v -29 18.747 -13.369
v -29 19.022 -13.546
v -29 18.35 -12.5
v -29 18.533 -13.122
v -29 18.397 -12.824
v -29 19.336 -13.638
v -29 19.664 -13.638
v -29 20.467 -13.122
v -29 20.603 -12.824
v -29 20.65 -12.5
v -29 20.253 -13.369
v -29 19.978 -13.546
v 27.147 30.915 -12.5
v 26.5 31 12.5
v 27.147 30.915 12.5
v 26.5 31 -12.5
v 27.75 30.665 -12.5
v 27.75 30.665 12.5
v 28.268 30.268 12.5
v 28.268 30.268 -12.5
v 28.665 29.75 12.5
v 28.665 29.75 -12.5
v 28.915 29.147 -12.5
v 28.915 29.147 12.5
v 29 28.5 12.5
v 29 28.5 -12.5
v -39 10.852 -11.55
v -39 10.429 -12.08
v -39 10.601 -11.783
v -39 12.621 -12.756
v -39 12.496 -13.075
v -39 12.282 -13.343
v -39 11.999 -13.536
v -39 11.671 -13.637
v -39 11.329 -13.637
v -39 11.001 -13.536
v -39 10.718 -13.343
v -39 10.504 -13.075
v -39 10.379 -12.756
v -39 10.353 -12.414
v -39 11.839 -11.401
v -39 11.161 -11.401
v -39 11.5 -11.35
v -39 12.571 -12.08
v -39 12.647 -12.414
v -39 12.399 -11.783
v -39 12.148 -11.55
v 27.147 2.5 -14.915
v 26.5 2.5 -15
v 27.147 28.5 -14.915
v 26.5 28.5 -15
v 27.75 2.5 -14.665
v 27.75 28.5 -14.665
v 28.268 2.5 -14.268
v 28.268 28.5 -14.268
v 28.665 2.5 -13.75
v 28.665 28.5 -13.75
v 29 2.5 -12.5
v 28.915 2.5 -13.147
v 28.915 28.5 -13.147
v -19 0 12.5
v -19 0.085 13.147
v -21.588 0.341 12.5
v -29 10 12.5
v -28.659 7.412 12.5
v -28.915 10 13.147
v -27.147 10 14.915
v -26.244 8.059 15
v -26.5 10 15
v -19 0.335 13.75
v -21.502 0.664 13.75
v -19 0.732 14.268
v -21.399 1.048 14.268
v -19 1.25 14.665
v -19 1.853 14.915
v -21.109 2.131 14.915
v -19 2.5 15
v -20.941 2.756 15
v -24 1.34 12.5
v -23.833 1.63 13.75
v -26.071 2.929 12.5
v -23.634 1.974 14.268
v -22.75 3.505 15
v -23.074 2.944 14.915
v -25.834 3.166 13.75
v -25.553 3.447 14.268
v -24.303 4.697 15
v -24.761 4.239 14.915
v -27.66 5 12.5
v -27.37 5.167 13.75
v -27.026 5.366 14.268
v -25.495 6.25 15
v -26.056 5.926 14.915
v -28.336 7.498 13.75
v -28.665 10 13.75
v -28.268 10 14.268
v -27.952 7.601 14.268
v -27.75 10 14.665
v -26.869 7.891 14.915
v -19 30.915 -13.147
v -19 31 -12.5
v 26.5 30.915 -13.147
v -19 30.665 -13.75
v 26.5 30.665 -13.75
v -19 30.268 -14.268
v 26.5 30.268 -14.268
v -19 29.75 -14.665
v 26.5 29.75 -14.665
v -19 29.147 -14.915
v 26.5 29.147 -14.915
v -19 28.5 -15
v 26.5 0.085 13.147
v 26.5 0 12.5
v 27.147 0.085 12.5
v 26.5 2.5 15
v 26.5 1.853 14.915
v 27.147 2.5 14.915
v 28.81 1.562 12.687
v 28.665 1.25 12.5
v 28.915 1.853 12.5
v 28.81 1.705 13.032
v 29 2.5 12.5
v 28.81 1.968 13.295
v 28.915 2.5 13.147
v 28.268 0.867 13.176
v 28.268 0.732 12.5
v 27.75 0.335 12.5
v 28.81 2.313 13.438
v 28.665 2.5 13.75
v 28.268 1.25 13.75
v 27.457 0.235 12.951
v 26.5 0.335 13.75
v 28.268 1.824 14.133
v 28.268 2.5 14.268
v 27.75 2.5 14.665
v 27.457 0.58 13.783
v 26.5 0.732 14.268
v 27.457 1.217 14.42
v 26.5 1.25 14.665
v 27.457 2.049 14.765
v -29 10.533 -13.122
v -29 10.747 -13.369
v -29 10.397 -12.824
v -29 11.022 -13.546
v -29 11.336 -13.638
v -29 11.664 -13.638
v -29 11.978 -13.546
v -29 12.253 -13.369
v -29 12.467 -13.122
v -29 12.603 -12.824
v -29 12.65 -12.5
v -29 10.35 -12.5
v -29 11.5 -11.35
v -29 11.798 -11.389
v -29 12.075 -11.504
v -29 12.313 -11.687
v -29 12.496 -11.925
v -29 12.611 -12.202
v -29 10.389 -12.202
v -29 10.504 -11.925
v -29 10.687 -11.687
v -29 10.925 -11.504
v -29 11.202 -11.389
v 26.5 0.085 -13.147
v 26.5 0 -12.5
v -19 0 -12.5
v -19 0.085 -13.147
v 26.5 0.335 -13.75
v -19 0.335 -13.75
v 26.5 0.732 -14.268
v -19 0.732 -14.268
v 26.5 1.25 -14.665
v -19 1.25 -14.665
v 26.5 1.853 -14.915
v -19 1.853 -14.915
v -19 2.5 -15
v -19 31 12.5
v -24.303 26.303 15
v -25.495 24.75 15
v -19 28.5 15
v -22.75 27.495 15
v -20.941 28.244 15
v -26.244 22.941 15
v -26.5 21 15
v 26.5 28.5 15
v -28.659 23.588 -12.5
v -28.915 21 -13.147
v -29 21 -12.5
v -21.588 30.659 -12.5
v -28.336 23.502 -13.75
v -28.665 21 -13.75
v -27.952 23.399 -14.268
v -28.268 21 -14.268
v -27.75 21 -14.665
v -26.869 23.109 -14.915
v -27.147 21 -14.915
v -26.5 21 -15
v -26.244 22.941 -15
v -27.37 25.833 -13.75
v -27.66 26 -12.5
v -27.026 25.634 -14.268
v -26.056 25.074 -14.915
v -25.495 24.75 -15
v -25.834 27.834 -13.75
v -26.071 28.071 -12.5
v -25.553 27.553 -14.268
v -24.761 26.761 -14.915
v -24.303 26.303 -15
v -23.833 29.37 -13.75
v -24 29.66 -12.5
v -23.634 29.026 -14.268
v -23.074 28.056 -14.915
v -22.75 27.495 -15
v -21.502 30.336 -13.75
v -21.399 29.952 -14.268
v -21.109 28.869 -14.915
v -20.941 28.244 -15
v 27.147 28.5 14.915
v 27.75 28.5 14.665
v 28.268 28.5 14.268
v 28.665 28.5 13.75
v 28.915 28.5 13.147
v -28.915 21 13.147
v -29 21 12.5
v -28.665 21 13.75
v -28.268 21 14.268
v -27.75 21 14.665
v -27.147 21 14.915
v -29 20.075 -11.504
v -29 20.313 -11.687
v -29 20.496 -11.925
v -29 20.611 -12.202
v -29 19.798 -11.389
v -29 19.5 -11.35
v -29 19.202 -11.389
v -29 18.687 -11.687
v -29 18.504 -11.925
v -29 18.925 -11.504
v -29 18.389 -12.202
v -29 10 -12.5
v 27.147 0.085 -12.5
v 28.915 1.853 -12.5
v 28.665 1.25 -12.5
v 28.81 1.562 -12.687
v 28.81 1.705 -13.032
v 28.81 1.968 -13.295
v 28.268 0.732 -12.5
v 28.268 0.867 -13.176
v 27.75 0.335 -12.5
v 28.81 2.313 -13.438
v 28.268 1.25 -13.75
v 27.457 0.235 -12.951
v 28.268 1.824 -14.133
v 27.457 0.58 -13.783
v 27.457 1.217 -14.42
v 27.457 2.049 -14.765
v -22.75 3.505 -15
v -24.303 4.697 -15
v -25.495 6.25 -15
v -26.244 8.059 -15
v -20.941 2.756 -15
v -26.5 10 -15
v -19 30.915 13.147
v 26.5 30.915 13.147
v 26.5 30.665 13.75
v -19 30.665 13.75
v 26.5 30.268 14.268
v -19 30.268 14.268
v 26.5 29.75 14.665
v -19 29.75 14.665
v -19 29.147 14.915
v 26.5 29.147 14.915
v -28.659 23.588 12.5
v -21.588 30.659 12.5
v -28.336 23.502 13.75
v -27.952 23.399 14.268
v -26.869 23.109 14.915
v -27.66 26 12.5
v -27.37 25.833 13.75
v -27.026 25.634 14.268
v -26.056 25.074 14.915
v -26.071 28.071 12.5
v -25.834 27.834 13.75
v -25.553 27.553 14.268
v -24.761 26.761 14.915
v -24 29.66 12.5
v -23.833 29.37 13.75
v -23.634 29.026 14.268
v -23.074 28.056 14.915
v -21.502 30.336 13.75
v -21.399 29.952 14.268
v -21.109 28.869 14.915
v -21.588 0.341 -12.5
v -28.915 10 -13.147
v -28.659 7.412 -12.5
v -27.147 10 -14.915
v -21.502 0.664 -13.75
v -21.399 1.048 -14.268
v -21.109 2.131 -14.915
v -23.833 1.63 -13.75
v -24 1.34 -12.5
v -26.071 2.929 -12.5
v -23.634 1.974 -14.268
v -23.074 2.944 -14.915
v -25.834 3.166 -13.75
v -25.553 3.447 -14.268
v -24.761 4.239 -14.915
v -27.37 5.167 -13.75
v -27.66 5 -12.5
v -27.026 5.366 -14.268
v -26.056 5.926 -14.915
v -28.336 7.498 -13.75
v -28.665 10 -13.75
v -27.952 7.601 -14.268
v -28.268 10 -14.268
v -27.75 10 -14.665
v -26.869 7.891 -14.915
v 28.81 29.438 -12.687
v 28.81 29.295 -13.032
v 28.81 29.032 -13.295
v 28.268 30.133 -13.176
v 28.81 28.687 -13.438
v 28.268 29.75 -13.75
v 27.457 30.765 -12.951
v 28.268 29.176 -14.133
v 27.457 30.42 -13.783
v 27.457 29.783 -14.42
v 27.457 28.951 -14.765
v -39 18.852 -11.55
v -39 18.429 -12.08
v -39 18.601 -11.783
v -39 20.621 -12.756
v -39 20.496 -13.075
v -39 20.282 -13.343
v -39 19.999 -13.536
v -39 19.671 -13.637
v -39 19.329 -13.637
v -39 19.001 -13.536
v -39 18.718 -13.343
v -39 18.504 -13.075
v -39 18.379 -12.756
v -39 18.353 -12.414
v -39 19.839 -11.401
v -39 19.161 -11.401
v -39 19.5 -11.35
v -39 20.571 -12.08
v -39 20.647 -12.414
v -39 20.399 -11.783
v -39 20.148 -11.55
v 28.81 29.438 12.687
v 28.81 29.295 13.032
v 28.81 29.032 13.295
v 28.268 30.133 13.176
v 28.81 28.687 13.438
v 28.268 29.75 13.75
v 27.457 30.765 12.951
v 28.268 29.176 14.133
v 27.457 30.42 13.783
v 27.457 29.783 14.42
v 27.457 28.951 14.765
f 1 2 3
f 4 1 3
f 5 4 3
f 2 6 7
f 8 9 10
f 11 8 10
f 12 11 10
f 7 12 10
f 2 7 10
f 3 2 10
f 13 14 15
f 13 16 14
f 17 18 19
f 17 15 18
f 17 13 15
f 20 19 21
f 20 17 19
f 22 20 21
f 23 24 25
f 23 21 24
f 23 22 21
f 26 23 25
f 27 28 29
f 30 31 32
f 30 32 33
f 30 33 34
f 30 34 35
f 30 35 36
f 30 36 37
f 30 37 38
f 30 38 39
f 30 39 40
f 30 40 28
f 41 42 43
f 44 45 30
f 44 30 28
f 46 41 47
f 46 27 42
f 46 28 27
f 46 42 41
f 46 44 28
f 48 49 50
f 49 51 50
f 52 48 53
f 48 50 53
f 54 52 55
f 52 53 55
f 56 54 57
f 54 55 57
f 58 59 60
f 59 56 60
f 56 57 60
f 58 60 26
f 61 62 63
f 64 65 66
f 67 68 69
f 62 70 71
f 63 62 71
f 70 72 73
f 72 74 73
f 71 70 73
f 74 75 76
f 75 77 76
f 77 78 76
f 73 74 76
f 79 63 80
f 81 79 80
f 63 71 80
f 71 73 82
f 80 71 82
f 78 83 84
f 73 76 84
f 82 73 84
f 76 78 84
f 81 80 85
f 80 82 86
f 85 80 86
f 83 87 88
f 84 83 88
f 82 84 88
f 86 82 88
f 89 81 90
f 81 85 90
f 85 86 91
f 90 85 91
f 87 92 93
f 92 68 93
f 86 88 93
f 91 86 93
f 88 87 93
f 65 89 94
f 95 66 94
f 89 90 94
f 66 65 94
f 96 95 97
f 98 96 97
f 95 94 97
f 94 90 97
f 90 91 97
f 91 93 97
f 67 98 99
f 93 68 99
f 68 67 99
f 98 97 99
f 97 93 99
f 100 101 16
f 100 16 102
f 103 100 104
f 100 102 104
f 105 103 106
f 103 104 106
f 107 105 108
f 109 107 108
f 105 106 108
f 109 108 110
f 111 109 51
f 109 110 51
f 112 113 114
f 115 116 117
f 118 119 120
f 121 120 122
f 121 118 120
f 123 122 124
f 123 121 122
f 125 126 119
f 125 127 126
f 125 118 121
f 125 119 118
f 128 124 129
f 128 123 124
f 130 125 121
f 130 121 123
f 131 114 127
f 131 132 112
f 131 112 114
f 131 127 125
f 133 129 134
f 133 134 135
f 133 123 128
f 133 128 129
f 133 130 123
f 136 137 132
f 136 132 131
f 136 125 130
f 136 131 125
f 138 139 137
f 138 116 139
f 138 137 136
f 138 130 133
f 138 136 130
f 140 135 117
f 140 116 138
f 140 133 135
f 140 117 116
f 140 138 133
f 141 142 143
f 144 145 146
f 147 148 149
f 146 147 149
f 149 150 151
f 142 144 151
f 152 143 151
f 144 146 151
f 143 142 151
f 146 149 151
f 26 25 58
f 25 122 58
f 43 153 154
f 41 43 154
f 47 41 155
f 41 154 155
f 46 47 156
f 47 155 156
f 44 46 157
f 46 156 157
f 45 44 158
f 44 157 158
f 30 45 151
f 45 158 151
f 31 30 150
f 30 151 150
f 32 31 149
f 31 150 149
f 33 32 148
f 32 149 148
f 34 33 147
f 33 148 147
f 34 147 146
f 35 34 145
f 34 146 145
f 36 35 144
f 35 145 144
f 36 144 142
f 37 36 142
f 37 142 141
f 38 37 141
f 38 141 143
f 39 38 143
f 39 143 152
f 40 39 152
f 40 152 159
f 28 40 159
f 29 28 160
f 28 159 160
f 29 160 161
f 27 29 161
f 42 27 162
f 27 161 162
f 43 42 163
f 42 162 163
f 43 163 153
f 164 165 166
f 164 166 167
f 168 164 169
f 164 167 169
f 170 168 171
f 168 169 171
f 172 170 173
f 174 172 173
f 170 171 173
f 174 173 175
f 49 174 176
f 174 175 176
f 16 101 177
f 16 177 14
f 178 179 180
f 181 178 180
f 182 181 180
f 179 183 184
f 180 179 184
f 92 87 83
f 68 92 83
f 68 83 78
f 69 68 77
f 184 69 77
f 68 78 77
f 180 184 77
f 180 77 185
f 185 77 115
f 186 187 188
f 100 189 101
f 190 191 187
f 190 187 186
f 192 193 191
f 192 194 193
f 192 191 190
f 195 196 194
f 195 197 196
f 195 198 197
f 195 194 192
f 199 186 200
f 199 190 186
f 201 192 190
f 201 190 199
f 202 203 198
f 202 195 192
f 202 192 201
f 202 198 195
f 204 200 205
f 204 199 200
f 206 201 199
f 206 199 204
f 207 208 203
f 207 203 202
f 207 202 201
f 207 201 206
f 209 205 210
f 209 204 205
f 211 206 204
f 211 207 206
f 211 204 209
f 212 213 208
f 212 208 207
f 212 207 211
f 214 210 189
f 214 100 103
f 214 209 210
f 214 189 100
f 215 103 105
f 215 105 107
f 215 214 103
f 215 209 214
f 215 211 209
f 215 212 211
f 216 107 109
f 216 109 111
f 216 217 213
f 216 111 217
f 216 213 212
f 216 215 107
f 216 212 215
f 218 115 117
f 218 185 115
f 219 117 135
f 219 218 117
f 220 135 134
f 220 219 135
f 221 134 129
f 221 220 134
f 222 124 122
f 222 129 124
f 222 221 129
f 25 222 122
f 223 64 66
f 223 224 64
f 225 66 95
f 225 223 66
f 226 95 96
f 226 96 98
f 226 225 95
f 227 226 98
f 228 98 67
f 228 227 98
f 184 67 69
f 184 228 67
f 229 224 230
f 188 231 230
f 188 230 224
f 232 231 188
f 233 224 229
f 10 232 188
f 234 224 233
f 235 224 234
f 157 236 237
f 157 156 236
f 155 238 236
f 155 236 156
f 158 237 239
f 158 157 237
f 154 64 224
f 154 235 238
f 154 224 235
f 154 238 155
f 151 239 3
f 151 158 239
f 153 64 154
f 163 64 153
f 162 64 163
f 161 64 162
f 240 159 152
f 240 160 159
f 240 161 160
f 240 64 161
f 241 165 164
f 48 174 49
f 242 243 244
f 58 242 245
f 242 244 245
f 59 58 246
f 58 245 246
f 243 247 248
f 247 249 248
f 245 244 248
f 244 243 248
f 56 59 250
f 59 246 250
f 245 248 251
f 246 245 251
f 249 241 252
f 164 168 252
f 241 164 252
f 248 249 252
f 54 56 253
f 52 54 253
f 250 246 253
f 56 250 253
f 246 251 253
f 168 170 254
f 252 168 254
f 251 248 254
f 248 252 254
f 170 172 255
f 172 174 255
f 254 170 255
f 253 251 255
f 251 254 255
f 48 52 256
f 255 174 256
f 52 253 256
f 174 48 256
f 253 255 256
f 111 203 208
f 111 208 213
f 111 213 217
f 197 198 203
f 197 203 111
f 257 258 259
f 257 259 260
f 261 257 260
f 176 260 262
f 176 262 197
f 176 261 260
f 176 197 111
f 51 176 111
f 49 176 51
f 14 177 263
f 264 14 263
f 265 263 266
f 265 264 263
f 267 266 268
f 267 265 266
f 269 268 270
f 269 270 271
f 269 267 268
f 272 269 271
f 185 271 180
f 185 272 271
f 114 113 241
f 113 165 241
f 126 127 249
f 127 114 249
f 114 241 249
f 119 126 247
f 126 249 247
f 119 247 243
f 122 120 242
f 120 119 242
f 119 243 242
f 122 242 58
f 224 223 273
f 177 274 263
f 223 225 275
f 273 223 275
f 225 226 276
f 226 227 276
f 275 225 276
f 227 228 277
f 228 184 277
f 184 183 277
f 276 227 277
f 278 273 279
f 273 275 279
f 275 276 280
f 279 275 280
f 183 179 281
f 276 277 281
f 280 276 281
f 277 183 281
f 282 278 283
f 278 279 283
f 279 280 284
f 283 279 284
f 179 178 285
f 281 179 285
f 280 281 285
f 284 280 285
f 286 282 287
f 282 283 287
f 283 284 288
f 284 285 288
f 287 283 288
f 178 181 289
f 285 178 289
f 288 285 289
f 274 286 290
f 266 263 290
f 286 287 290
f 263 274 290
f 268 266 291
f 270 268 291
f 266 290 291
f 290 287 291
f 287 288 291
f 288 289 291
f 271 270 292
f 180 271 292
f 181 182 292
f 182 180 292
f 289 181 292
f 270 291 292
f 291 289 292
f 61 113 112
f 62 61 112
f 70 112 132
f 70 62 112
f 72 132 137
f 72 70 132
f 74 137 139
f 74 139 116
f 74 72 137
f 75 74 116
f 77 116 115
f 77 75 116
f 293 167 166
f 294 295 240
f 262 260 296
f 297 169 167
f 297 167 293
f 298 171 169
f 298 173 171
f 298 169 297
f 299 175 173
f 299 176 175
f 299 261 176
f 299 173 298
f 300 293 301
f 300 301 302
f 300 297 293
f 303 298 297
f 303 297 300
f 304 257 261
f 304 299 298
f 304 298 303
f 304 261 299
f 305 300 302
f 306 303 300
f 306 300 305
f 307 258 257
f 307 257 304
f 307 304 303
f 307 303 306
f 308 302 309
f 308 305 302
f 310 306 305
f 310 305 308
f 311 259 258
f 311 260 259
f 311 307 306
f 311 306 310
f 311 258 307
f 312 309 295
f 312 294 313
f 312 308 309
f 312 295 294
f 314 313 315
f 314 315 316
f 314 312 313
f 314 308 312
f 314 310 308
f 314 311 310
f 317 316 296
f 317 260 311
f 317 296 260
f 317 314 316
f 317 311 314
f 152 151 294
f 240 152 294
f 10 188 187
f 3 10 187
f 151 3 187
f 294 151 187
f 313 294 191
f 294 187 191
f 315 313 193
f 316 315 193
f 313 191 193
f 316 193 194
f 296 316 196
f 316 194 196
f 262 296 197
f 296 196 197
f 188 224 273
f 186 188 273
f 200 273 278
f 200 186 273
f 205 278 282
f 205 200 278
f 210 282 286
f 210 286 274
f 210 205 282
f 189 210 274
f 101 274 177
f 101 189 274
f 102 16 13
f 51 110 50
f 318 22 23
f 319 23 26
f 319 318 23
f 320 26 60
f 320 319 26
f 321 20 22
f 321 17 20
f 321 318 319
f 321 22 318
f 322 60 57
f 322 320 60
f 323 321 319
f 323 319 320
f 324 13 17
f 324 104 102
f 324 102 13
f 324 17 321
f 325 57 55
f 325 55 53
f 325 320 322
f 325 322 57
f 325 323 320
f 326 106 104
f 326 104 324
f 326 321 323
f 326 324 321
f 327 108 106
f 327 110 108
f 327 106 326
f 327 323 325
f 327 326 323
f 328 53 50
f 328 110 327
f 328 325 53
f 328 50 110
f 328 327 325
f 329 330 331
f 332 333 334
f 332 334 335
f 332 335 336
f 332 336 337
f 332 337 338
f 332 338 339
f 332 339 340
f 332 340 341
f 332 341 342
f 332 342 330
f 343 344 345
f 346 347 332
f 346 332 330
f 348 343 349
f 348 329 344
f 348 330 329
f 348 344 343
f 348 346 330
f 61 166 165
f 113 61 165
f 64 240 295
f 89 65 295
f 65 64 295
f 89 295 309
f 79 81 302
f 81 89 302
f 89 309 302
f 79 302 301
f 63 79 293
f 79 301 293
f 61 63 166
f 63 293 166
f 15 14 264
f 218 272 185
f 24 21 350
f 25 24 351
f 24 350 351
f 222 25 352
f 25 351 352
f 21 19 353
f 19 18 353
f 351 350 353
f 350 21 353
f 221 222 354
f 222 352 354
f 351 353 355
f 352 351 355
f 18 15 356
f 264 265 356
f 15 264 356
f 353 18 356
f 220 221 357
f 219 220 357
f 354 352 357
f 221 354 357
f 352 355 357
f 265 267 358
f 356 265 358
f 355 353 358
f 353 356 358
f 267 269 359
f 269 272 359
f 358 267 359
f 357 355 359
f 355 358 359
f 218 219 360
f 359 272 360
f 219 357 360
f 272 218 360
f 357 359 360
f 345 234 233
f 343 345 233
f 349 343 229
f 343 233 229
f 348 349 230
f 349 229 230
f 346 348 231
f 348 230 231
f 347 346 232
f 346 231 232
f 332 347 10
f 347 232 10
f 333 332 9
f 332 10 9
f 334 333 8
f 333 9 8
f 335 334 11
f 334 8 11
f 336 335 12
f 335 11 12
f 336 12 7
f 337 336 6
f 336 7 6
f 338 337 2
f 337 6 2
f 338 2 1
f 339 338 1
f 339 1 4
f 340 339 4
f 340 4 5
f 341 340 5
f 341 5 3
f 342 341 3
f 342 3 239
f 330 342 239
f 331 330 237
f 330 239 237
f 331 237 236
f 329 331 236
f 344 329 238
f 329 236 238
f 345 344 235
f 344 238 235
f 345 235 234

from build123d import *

# Parameters (mm, degrees)
SKETCH1_W           = 58
SKETCH1_H           = 30
BOSS_EXTRUDE1_DEPTH = 31
FILLET1_R           = 10
FILLET2_R           = 2.5
SKETCH2_R           = 1.15
BOSS_EXTRUDE2_DEPTH = 10


with BuildPart() as part:
    # Sketch1 → Boss-Extrude1 (new body)
    with BuildSketch(Plane(origin=(0, 0, 0), x_dir=(1, 0, 0), z_dir=(0, 1, 0))):
        Rectangle(SKETCH1_W, SKETCH1_H)
    extrude(amount=BOSS_EXTRUDE1_DEPTH)

    # Fillet1
    fillet1_edges = [part.edges().sort_by_distance(p)[0] for p in [
        (-29, 31, 0),
        (-29, 0, 0),
    ]]
    fillet(fillet1_edges, radius=FILLET1_R)

    # Fillet2
    fillet2_edges = [part.edges().sort_by_distance(p)[0] for p in [
        (-29, 15.5, 15),
        (-29, 15.5, -15),
        (5, 0, 15),
        (5, 31, 15),
        (-26.071067812, 28.071067812, 15),
        (-26.071067812, 2.928932188, 15),
        (-26.071067812, 28.071067812, -15),
        (-26.071067812, 2.928932188, -15),
        (29, 31, 0),
        (5, 0, -15),
        (29, 0, 0),
        (5, 31, -15),
        (29, 15.5, 15),
        (29, 15.5, -15),
    ]]
    fillet(fillet2_edges, radius=FILLET2_R)

    # Sketch2 → Boss-Extrude2 (add)
    with BuildSketch(Plane.ZY.offset(29)):
        with Locations((-12.5, 19.5)):
            Circle(SKETCH2_R)
        with Locations((-12.5, 11.5)):
            Circle(SKETCH2_R)
    extrude(amount=BOSS_EXTRUDE2_DEPTH)


solid = part.part
